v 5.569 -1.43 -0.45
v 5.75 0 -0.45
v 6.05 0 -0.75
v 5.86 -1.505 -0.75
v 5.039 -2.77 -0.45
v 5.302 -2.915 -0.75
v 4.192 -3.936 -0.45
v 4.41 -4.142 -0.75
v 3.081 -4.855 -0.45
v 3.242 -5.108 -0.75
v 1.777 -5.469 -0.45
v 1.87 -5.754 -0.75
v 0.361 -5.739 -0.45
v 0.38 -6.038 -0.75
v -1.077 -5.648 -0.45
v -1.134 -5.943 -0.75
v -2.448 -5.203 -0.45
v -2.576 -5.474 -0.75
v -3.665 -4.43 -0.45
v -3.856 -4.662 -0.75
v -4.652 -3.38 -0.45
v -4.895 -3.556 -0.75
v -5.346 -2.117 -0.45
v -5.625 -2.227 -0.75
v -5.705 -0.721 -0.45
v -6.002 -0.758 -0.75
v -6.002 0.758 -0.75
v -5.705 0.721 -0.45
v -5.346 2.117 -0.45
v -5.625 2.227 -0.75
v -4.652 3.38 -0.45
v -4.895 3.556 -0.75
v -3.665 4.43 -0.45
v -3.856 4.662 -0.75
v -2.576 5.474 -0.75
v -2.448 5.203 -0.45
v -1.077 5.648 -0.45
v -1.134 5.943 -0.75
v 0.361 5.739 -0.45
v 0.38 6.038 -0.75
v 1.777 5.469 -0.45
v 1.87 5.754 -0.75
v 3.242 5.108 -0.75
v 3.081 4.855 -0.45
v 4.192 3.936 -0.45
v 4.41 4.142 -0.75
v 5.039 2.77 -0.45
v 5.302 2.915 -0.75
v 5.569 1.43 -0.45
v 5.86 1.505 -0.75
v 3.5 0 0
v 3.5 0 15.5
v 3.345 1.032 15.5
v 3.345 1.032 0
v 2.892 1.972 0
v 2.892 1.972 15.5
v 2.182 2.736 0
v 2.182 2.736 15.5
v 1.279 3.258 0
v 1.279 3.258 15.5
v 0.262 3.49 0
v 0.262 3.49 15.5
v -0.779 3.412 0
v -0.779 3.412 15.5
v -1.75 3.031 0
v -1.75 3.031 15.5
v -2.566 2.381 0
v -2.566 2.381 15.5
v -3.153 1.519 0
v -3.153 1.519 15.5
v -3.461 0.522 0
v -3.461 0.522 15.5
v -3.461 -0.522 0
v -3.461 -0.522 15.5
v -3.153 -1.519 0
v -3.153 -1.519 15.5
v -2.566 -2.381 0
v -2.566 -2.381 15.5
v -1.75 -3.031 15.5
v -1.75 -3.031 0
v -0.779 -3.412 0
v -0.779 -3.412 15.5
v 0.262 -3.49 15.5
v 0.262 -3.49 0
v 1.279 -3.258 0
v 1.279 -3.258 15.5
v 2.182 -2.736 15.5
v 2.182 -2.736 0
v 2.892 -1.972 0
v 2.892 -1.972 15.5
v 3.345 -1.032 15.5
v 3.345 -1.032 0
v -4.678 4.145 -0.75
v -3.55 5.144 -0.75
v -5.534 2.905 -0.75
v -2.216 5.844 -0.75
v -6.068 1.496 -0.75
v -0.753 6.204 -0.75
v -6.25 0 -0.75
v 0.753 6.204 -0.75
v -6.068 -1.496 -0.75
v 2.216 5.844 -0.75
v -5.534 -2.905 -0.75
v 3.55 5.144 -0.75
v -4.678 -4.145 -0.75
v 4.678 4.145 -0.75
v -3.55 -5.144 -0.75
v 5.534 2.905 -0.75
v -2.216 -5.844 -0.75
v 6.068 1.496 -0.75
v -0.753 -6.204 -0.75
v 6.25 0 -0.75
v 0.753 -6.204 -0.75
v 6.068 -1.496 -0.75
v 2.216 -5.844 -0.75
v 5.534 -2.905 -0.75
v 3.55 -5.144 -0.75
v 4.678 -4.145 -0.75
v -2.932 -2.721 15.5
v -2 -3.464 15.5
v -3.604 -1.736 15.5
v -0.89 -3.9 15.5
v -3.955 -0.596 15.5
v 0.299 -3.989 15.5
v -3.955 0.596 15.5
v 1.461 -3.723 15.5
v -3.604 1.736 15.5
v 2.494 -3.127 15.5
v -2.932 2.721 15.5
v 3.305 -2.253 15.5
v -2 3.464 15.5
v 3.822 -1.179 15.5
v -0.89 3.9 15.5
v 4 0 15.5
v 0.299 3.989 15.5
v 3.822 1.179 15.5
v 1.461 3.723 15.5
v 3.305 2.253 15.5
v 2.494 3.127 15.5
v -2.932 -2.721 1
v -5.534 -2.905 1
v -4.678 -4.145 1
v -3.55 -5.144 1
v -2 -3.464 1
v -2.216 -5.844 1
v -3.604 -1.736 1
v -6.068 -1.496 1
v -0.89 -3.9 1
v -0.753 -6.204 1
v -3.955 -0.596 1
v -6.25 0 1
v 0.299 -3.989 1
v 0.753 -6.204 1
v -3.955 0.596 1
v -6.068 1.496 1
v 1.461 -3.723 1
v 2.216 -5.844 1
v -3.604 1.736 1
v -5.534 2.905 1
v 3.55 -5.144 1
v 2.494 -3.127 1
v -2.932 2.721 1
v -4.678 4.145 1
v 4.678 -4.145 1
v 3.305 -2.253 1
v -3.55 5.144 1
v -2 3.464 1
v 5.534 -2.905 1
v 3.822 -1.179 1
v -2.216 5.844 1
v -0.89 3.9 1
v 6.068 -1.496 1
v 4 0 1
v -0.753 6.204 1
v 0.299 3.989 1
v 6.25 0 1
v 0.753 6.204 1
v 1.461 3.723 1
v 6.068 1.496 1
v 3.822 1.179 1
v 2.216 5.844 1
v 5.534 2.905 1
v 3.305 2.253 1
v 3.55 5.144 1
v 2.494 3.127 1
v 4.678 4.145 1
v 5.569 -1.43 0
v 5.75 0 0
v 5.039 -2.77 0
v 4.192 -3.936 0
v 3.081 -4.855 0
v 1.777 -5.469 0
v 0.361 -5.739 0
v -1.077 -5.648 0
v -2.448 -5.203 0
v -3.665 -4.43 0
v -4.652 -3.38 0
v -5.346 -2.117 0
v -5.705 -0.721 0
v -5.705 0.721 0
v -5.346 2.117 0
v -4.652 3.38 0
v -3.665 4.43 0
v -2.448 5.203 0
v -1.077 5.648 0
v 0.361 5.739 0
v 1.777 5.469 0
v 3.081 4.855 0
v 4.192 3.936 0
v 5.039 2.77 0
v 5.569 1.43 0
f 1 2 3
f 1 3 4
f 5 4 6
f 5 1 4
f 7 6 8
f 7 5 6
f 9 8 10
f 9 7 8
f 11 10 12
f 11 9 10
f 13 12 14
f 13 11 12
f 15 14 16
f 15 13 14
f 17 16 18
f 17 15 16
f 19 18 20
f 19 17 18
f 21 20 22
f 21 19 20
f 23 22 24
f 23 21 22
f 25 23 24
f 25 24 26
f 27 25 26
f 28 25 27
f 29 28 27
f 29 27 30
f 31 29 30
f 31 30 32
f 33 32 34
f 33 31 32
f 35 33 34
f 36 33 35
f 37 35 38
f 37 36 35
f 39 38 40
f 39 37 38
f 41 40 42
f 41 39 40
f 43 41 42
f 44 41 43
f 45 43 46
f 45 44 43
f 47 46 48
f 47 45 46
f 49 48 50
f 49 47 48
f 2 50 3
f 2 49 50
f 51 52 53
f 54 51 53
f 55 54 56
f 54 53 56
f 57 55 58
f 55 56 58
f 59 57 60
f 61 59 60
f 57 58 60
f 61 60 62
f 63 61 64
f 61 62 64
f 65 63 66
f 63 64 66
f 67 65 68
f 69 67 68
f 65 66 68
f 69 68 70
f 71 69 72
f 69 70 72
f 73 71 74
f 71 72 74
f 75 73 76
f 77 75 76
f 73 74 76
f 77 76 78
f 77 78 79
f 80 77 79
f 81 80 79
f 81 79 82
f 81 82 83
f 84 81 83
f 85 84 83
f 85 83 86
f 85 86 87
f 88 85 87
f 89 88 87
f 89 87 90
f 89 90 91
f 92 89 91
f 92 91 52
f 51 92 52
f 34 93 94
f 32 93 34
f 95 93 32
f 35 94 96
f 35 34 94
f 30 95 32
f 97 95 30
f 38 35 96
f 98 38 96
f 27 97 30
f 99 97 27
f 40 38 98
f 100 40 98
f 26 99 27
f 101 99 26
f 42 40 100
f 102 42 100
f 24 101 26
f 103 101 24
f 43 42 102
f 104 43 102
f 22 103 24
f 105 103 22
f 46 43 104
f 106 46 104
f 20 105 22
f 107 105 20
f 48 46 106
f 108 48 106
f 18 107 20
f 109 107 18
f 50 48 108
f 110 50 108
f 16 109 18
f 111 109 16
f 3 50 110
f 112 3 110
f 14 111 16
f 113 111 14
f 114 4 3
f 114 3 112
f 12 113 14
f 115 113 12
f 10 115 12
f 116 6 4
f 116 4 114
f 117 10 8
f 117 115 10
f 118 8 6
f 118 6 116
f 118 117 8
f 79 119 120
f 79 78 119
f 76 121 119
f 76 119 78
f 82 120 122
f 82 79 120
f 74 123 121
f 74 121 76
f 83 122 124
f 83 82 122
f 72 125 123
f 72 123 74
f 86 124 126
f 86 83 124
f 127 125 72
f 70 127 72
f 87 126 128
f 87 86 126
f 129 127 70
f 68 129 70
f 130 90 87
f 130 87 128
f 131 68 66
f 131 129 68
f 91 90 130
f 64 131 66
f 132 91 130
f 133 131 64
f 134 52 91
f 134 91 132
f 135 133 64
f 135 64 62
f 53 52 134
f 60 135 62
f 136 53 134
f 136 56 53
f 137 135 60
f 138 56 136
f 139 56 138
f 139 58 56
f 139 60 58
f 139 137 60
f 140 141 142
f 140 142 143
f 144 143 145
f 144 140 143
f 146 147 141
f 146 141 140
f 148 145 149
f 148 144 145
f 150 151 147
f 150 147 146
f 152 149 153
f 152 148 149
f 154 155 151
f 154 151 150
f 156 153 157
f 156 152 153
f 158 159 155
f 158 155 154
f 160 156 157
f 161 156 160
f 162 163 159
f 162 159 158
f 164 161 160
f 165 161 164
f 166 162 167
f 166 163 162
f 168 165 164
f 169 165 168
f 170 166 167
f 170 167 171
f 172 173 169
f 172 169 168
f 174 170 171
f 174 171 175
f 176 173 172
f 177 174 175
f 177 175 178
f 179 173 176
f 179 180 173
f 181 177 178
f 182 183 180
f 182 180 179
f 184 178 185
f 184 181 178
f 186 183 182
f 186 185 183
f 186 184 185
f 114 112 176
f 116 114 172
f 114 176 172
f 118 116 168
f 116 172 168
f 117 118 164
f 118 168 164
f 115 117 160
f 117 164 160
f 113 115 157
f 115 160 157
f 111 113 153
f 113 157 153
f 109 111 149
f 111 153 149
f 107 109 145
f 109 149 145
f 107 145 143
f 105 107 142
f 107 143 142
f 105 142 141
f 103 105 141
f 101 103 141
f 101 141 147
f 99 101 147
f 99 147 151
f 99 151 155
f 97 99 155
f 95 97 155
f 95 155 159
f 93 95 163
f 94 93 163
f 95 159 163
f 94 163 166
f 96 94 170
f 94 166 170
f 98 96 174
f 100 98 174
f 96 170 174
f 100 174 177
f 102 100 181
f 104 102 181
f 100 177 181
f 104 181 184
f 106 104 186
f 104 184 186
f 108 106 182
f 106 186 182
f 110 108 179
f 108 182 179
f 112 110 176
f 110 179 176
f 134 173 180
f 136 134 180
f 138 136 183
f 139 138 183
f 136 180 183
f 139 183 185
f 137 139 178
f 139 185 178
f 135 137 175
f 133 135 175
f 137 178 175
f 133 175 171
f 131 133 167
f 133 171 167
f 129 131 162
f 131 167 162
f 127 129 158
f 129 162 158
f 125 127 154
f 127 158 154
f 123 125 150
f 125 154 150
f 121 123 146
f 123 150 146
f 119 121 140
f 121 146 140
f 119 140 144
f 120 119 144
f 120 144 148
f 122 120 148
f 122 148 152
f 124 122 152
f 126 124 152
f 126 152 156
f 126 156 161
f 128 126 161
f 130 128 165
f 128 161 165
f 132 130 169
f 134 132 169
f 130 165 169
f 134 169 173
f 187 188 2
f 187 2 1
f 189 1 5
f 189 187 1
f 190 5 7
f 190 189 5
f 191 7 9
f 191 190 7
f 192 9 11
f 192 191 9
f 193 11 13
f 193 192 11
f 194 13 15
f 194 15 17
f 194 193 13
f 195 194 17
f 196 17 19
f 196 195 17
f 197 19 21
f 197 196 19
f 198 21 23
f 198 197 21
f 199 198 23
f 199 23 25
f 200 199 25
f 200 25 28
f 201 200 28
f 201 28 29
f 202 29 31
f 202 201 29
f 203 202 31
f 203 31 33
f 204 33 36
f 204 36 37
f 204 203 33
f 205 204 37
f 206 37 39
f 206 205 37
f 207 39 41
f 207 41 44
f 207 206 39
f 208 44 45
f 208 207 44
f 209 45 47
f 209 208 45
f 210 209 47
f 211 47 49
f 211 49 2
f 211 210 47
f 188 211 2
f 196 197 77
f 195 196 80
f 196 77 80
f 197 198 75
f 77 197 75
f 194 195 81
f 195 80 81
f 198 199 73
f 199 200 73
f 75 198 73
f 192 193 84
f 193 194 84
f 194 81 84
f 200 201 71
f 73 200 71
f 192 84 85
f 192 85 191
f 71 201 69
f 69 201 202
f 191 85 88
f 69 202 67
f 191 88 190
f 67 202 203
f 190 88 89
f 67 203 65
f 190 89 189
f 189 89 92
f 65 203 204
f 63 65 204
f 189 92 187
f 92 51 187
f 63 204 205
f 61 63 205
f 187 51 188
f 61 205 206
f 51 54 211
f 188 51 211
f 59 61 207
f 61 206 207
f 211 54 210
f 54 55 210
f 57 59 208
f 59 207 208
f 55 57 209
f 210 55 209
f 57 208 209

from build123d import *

# Parameters (mm, degrees)
F0_R     = 6.25
F1_DEPTH = 1
F2_R     = 6.25
F2_R_2   = 5.75
F3_DEPTH = 0.75
F4_R     = 4
F5_DEPTH = 14.5
F6_R     = 3.5
F7_DEPTH = 25
F8_SIZE  = 0.3


with BuildPart() as f1:
    # F0 (on Top) → F1 (new body)
    with BuildSketch(Plane.XY):
        Circle(F0_R)
    extrude(amount=F1_DEPTH)

    # F2 (on face) → F3 (join)
    with BuildSketch(Plane(origin=(0, 0, 0), x_dir=(1, 0, 0), z_dir=(0, 0, -1))):
        Circle(F2_R)
        Circle(F2_R_2, mode=Mode.SUBTRACT)
    extrude(amount=F3_DEPTH)

    # F4 (on face) → F5 (join)
    with BuildSketch(Plane.XY.offset(1)):
        Circle(F4_R)
    extrude(amount=F5_DEPTH)

    # F6 (on face) → F7 (cut)
    with BuildSketch(Plane.XY.offset(15.5)):
        Circle(F6_R)
    extrude(amount=-F7_DEPTH, mode=Mode.SUBTRACT)

    # F8
    f8_edges = [f1.edges().sort_by_distance(p)[0] for p in [
        (-5.75, 0, -0.75),
    ]]
    chamfer(f8_edges, length=F8_SIZE)


solid = f1.part
